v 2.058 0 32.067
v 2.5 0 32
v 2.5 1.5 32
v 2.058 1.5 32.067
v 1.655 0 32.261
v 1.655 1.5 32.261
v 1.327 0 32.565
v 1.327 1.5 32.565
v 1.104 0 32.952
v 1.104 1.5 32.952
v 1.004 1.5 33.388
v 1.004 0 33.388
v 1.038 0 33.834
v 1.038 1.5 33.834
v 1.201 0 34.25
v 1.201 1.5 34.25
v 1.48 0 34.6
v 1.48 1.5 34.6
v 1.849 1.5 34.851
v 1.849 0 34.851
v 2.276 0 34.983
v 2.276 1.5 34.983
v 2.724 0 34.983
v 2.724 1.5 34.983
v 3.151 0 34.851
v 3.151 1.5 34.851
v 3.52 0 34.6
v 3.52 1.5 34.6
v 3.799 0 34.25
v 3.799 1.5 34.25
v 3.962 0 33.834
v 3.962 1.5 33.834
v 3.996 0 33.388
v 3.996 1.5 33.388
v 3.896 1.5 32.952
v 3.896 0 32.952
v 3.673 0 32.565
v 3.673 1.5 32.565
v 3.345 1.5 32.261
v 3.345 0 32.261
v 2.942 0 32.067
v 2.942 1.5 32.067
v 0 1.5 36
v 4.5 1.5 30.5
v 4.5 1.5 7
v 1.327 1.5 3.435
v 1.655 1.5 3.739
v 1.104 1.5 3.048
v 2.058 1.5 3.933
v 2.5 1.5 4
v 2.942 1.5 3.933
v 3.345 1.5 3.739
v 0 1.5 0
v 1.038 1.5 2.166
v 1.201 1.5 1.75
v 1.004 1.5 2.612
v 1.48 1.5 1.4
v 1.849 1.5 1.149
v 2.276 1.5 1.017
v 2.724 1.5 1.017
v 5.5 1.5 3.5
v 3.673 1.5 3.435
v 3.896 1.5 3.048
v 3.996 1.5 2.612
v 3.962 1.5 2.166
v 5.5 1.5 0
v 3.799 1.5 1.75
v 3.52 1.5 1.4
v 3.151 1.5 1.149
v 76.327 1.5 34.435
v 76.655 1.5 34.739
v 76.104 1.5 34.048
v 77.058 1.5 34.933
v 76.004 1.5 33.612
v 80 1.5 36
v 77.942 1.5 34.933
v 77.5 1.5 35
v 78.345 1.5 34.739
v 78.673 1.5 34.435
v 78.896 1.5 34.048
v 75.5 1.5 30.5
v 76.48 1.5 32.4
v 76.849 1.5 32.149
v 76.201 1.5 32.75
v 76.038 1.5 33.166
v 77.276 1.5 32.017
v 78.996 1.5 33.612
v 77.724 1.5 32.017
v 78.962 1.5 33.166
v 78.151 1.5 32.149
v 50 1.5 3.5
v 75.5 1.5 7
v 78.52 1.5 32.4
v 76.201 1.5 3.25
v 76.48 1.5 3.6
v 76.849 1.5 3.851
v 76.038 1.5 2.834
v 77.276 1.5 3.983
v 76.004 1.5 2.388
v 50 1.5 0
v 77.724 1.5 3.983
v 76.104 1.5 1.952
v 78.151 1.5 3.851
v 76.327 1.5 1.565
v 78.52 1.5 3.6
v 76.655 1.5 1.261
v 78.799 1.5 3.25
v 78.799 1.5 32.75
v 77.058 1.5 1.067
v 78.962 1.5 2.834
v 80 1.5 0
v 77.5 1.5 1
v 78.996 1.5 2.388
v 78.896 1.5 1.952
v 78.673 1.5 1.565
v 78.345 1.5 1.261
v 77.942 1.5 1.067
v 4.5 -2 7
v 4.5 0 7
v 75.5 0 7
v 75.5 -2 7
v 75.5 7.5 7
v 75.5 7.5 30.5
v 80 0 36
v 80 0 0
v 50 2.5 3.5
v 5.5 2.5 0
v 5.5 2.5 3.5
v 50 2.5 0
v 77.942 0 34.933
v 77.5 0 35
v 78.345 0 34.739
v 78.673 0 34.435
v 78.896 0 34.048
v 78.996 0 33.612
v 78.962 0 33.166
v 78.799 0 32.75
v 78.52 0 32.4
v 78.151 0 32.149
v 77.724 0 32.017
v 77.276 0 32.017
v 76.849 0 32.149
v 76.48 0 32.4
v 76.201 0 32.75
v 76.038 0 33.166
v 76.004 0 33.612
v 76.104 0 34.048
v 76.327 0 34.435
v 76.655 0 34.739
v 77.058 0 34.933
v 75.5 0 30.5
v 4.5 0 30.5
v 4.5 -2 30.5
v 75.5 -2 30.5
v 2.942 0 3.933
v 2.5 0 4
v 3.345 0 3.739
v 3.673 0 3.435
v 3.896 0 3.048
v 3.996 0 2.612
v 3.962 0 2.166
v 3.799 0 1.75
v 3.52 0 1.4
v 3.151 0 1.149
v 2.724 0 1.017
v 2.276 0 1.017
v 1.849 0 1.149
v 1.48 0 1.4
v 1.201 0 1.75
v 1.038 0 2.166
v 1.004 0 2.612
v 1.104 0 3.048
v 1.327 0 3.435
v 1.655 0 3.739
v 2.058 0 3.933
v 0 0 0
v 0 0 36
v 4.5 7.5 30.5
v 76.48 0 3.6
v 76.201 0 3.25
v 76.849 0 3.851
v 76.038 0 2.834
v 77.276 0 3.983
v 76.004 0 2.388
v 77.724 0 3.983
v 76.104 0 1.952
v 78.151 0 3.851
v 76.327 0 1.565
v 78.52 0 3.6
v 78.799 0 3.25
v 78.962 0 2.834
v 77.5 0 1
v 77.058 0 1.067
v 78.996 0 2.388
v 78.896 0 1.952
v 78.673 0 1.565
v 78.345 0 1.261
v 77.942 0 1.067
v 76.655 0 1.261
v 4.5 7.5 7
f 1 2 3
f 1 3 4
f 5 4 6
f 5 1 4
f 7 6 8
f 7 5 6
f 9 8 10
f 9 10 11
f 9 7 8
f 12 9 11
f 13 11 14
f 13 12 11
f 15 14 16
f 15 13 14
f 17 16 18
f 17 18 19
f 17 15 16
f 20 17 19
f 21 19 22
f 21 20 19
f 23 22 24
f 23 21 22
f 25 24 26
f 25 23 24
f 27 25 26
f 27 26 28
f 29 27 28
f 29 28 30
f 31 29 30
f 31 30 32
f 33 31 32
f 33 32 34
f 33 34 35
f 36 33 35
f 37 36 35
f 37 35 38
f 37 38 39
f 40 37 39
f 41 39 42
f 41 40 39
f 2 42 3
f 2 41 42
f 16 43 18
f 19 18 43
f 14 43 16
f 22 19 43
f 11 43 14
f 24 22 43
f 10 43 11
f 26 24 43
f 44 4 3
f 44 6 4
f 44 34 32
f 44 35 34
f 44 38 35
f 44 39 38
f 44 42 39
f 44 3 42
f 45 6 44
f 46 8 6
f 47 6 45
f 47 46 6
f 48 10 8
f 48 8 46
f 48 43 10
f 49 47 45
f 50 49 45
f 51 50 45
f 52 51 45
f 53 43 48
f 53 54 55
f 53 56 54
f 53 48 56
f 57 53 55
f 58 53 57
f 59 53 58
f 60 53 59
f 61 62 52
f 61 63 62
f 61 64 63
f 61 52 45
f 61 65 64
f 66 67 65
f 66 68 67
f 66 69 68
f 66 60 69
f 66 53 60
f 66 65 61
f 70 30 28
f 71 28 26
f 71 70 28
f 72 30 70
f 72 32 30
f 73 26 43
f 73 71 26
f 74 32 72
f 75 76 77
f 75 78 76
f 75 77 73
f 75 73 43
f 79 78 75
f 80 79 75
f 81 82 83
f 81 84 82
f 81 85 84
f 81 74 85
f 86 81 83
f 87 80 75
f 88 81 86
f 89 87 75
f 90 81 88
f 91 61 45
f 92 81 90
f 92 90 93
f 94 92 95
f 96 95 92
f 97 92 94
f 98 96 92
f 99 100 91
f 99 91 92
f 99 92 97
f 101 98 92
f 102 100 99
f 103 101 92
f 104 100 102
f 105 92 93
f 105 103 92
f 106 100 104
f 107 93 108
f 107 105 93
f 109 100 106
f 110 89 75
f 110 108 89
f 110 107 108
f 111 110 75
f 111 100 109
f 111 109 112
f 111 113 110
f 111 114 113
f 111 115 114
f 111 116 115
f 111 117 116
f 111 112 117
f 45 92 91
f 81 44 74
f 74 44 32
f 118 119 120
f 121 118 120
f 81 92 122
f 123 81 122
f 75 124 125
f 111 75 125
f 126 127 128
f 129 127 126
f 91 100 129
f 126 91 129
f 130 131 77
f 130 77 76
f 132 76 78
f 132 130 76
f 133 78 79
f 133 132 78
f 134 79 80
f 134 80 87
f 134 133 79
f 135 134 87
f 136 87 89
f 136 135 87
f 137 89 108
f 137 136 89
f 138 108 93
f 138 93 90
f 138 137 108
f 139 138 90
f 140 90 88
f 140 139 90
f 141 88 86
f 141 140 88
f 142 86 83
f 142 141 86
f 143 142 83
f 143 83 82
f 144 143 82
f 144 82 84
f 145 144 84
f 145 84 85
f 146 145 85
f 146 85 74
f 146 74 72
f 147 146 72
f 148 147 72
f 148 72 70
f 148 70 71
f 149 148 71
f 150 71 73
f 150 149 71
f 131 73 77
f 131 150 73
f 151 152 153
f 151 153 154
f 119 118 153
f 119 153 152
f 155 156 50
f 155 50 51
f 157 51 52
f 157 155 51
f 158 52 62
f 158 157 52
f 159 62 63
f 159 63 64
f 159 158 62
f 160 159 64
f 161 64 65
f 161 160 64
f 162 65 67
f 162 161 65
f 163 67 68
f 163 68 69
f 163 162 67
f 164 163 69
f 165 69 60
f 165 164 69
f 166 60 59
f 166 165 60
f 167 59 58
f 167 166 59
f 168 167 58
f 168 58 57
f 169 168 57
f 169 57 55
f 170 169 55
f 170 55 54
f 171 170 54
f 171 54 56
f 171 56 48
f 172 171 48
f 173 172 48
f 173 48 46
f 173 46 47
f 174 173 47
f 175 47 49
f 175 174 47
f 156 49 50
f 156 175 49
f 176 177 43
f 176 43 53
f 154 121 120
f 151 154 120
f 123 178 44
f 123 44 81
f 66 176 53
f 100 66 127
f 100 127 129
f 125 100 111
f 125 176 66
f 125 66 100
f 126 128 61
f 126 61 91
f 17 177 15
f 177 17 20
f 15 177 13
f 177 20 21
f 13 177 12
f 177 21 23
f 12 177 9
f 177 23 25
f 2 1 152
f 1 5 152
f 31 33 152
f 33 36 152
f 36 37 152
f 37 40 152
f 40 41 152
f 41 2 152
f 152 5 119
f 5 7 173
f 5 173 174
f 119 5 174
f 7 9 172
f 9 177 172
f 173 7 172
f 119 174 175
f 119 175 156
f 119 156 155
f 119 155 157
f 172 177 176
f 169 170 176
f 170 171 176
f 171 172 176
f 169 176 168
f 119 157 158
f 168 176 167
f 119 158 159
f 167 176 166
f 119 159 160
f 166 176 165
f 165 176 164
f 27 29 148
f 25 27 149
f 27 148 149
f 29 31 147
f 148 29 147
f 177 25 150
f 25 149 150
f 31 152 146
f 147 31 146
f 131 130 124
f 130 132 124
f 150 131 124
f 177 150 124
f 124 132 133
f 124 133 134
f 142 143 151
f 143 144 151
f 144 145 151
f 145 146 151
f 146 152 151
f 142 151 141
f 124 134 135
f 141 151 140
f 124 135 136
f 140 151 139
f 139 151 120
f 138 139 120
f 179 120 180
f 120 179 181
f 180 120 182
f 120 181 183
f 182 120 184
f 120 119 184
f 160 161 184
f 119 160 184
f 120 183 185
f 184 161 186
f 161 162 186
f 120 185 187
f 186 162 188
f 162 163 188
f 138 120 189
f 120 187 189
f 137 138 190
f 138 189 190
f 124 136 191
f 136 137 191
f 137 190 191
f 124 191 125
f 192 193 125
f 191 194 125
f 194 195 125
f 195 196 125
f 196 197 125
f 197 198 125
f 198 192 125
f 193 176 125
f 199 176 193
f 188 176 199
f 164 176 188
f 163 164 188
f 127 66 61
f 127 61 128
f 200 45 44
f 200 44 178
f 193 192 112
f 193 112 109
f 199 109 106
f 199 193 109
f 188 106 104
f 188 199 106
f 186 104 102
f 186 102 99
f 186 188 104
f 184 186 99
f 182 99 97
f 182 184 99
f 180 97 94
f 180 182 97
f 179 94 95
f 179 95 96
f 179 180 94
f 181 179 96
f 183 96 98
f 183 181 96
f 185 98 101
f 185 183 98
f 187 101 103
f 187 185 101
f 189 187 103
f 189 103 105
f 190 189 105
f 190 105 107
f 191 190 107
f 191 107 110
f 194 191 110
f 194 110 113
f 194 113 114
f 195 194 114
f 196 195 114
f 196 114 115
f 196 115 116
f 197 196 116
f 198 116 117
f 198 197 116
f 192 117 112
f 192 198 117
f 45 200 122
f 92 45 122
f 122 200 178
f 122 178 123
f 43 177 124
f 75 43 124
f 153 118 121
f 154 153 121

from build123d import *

# Parameters (mm, degrees)
SKETCH_1_W            = 80
SKETCH_1_H            = 36
SKETCH_1_R            = 1.5
EXTRUDE_1_DEPTH       = 1.5
EXTRUDE_START         = 7
EXTRUDE_2_OUTLINE_W   = 71
EXTRUDE_2_OUTLINE_H   = 6
EXTRUDE_2_OUTLINE_H_2 = 2
EXTRUDE_2_DEPTH       = 23.5
EXTRUDE_2_2_OUTLINE_W = 44.5
EXTRUDE_2_2_OUTLINE_H = 1
EXTRUDE_2_2_DEPTH     = 3.5


# Read off the part's stored shape, not the designer's step: Бобышка-Вытянуть2
with BuildPart() as part:
    # Эскиз1 (on Top Plane) → Бобышка-Вытянуть1 (new body)
    with BuildSketch(Plane(origin=(0, 0, 0), x_dir=(1, 0, 0), z_dir=(0, 1, 0))):
        with Locations((40, -18)):
            Rectangle(SKETCH_1_W, SKETCH_1_H)
        with Locations(Location((2.5, -2.5, 0), (0, 0, 270))):
            Circle(SKETCH_1_R, mode=Mode.SUBTRACT)
        with Locations(Location((77.5, -2.5, 0), (0, 0, 90))):
            Circle(SKETCH_1_R, mode=Mode.SUBTRACT)
        with Locations(Location((77.5, -33.5, 0), (0, 0, 270))):
            Circle(SKETCH_1_R, mode=Mode.SUBTRACT)
        with Locations(Location((2.5, -33.5, 0), (0, 0, 90))):
            Circle(SKETCH_1_R, mode=Mode.SUBTRACT)
    extrude(amount=EXTRUDE_1_DEPTH)

    # Бобышка-Вытянуть2 outline → Бобышка-Вытянуть2 (add)
    with BuildSketch(Plane.XY.offset(EXTRUDE_START)):
        with Locations((40, 4.5)):
            Rectangle(EXTRUDE_2_OUTLINE_W, EXTRUDE_2_OUTLINE_H)
        with Locations((40, -1)):
            Rectangle(EXTRUDE_2_OUTLINE_W, EXTRUDE_2_OUTLINE_H_2)
    extrude(amount=EXTRUDE_2_DEPTH)

    # Extrude 2 2 outline → Extrude 2 2 (add)
    with BuildSketch(Plane.XY):
        with Locations((27.75, 2)):
            Rectangle(EXTRUDE_2_2_OUTLINE_W, EXTRUDE_2_2_OUTLINE_H)
    extrude(amount=EXTRUDE_2_2_DEPTH)


solid = part.part
